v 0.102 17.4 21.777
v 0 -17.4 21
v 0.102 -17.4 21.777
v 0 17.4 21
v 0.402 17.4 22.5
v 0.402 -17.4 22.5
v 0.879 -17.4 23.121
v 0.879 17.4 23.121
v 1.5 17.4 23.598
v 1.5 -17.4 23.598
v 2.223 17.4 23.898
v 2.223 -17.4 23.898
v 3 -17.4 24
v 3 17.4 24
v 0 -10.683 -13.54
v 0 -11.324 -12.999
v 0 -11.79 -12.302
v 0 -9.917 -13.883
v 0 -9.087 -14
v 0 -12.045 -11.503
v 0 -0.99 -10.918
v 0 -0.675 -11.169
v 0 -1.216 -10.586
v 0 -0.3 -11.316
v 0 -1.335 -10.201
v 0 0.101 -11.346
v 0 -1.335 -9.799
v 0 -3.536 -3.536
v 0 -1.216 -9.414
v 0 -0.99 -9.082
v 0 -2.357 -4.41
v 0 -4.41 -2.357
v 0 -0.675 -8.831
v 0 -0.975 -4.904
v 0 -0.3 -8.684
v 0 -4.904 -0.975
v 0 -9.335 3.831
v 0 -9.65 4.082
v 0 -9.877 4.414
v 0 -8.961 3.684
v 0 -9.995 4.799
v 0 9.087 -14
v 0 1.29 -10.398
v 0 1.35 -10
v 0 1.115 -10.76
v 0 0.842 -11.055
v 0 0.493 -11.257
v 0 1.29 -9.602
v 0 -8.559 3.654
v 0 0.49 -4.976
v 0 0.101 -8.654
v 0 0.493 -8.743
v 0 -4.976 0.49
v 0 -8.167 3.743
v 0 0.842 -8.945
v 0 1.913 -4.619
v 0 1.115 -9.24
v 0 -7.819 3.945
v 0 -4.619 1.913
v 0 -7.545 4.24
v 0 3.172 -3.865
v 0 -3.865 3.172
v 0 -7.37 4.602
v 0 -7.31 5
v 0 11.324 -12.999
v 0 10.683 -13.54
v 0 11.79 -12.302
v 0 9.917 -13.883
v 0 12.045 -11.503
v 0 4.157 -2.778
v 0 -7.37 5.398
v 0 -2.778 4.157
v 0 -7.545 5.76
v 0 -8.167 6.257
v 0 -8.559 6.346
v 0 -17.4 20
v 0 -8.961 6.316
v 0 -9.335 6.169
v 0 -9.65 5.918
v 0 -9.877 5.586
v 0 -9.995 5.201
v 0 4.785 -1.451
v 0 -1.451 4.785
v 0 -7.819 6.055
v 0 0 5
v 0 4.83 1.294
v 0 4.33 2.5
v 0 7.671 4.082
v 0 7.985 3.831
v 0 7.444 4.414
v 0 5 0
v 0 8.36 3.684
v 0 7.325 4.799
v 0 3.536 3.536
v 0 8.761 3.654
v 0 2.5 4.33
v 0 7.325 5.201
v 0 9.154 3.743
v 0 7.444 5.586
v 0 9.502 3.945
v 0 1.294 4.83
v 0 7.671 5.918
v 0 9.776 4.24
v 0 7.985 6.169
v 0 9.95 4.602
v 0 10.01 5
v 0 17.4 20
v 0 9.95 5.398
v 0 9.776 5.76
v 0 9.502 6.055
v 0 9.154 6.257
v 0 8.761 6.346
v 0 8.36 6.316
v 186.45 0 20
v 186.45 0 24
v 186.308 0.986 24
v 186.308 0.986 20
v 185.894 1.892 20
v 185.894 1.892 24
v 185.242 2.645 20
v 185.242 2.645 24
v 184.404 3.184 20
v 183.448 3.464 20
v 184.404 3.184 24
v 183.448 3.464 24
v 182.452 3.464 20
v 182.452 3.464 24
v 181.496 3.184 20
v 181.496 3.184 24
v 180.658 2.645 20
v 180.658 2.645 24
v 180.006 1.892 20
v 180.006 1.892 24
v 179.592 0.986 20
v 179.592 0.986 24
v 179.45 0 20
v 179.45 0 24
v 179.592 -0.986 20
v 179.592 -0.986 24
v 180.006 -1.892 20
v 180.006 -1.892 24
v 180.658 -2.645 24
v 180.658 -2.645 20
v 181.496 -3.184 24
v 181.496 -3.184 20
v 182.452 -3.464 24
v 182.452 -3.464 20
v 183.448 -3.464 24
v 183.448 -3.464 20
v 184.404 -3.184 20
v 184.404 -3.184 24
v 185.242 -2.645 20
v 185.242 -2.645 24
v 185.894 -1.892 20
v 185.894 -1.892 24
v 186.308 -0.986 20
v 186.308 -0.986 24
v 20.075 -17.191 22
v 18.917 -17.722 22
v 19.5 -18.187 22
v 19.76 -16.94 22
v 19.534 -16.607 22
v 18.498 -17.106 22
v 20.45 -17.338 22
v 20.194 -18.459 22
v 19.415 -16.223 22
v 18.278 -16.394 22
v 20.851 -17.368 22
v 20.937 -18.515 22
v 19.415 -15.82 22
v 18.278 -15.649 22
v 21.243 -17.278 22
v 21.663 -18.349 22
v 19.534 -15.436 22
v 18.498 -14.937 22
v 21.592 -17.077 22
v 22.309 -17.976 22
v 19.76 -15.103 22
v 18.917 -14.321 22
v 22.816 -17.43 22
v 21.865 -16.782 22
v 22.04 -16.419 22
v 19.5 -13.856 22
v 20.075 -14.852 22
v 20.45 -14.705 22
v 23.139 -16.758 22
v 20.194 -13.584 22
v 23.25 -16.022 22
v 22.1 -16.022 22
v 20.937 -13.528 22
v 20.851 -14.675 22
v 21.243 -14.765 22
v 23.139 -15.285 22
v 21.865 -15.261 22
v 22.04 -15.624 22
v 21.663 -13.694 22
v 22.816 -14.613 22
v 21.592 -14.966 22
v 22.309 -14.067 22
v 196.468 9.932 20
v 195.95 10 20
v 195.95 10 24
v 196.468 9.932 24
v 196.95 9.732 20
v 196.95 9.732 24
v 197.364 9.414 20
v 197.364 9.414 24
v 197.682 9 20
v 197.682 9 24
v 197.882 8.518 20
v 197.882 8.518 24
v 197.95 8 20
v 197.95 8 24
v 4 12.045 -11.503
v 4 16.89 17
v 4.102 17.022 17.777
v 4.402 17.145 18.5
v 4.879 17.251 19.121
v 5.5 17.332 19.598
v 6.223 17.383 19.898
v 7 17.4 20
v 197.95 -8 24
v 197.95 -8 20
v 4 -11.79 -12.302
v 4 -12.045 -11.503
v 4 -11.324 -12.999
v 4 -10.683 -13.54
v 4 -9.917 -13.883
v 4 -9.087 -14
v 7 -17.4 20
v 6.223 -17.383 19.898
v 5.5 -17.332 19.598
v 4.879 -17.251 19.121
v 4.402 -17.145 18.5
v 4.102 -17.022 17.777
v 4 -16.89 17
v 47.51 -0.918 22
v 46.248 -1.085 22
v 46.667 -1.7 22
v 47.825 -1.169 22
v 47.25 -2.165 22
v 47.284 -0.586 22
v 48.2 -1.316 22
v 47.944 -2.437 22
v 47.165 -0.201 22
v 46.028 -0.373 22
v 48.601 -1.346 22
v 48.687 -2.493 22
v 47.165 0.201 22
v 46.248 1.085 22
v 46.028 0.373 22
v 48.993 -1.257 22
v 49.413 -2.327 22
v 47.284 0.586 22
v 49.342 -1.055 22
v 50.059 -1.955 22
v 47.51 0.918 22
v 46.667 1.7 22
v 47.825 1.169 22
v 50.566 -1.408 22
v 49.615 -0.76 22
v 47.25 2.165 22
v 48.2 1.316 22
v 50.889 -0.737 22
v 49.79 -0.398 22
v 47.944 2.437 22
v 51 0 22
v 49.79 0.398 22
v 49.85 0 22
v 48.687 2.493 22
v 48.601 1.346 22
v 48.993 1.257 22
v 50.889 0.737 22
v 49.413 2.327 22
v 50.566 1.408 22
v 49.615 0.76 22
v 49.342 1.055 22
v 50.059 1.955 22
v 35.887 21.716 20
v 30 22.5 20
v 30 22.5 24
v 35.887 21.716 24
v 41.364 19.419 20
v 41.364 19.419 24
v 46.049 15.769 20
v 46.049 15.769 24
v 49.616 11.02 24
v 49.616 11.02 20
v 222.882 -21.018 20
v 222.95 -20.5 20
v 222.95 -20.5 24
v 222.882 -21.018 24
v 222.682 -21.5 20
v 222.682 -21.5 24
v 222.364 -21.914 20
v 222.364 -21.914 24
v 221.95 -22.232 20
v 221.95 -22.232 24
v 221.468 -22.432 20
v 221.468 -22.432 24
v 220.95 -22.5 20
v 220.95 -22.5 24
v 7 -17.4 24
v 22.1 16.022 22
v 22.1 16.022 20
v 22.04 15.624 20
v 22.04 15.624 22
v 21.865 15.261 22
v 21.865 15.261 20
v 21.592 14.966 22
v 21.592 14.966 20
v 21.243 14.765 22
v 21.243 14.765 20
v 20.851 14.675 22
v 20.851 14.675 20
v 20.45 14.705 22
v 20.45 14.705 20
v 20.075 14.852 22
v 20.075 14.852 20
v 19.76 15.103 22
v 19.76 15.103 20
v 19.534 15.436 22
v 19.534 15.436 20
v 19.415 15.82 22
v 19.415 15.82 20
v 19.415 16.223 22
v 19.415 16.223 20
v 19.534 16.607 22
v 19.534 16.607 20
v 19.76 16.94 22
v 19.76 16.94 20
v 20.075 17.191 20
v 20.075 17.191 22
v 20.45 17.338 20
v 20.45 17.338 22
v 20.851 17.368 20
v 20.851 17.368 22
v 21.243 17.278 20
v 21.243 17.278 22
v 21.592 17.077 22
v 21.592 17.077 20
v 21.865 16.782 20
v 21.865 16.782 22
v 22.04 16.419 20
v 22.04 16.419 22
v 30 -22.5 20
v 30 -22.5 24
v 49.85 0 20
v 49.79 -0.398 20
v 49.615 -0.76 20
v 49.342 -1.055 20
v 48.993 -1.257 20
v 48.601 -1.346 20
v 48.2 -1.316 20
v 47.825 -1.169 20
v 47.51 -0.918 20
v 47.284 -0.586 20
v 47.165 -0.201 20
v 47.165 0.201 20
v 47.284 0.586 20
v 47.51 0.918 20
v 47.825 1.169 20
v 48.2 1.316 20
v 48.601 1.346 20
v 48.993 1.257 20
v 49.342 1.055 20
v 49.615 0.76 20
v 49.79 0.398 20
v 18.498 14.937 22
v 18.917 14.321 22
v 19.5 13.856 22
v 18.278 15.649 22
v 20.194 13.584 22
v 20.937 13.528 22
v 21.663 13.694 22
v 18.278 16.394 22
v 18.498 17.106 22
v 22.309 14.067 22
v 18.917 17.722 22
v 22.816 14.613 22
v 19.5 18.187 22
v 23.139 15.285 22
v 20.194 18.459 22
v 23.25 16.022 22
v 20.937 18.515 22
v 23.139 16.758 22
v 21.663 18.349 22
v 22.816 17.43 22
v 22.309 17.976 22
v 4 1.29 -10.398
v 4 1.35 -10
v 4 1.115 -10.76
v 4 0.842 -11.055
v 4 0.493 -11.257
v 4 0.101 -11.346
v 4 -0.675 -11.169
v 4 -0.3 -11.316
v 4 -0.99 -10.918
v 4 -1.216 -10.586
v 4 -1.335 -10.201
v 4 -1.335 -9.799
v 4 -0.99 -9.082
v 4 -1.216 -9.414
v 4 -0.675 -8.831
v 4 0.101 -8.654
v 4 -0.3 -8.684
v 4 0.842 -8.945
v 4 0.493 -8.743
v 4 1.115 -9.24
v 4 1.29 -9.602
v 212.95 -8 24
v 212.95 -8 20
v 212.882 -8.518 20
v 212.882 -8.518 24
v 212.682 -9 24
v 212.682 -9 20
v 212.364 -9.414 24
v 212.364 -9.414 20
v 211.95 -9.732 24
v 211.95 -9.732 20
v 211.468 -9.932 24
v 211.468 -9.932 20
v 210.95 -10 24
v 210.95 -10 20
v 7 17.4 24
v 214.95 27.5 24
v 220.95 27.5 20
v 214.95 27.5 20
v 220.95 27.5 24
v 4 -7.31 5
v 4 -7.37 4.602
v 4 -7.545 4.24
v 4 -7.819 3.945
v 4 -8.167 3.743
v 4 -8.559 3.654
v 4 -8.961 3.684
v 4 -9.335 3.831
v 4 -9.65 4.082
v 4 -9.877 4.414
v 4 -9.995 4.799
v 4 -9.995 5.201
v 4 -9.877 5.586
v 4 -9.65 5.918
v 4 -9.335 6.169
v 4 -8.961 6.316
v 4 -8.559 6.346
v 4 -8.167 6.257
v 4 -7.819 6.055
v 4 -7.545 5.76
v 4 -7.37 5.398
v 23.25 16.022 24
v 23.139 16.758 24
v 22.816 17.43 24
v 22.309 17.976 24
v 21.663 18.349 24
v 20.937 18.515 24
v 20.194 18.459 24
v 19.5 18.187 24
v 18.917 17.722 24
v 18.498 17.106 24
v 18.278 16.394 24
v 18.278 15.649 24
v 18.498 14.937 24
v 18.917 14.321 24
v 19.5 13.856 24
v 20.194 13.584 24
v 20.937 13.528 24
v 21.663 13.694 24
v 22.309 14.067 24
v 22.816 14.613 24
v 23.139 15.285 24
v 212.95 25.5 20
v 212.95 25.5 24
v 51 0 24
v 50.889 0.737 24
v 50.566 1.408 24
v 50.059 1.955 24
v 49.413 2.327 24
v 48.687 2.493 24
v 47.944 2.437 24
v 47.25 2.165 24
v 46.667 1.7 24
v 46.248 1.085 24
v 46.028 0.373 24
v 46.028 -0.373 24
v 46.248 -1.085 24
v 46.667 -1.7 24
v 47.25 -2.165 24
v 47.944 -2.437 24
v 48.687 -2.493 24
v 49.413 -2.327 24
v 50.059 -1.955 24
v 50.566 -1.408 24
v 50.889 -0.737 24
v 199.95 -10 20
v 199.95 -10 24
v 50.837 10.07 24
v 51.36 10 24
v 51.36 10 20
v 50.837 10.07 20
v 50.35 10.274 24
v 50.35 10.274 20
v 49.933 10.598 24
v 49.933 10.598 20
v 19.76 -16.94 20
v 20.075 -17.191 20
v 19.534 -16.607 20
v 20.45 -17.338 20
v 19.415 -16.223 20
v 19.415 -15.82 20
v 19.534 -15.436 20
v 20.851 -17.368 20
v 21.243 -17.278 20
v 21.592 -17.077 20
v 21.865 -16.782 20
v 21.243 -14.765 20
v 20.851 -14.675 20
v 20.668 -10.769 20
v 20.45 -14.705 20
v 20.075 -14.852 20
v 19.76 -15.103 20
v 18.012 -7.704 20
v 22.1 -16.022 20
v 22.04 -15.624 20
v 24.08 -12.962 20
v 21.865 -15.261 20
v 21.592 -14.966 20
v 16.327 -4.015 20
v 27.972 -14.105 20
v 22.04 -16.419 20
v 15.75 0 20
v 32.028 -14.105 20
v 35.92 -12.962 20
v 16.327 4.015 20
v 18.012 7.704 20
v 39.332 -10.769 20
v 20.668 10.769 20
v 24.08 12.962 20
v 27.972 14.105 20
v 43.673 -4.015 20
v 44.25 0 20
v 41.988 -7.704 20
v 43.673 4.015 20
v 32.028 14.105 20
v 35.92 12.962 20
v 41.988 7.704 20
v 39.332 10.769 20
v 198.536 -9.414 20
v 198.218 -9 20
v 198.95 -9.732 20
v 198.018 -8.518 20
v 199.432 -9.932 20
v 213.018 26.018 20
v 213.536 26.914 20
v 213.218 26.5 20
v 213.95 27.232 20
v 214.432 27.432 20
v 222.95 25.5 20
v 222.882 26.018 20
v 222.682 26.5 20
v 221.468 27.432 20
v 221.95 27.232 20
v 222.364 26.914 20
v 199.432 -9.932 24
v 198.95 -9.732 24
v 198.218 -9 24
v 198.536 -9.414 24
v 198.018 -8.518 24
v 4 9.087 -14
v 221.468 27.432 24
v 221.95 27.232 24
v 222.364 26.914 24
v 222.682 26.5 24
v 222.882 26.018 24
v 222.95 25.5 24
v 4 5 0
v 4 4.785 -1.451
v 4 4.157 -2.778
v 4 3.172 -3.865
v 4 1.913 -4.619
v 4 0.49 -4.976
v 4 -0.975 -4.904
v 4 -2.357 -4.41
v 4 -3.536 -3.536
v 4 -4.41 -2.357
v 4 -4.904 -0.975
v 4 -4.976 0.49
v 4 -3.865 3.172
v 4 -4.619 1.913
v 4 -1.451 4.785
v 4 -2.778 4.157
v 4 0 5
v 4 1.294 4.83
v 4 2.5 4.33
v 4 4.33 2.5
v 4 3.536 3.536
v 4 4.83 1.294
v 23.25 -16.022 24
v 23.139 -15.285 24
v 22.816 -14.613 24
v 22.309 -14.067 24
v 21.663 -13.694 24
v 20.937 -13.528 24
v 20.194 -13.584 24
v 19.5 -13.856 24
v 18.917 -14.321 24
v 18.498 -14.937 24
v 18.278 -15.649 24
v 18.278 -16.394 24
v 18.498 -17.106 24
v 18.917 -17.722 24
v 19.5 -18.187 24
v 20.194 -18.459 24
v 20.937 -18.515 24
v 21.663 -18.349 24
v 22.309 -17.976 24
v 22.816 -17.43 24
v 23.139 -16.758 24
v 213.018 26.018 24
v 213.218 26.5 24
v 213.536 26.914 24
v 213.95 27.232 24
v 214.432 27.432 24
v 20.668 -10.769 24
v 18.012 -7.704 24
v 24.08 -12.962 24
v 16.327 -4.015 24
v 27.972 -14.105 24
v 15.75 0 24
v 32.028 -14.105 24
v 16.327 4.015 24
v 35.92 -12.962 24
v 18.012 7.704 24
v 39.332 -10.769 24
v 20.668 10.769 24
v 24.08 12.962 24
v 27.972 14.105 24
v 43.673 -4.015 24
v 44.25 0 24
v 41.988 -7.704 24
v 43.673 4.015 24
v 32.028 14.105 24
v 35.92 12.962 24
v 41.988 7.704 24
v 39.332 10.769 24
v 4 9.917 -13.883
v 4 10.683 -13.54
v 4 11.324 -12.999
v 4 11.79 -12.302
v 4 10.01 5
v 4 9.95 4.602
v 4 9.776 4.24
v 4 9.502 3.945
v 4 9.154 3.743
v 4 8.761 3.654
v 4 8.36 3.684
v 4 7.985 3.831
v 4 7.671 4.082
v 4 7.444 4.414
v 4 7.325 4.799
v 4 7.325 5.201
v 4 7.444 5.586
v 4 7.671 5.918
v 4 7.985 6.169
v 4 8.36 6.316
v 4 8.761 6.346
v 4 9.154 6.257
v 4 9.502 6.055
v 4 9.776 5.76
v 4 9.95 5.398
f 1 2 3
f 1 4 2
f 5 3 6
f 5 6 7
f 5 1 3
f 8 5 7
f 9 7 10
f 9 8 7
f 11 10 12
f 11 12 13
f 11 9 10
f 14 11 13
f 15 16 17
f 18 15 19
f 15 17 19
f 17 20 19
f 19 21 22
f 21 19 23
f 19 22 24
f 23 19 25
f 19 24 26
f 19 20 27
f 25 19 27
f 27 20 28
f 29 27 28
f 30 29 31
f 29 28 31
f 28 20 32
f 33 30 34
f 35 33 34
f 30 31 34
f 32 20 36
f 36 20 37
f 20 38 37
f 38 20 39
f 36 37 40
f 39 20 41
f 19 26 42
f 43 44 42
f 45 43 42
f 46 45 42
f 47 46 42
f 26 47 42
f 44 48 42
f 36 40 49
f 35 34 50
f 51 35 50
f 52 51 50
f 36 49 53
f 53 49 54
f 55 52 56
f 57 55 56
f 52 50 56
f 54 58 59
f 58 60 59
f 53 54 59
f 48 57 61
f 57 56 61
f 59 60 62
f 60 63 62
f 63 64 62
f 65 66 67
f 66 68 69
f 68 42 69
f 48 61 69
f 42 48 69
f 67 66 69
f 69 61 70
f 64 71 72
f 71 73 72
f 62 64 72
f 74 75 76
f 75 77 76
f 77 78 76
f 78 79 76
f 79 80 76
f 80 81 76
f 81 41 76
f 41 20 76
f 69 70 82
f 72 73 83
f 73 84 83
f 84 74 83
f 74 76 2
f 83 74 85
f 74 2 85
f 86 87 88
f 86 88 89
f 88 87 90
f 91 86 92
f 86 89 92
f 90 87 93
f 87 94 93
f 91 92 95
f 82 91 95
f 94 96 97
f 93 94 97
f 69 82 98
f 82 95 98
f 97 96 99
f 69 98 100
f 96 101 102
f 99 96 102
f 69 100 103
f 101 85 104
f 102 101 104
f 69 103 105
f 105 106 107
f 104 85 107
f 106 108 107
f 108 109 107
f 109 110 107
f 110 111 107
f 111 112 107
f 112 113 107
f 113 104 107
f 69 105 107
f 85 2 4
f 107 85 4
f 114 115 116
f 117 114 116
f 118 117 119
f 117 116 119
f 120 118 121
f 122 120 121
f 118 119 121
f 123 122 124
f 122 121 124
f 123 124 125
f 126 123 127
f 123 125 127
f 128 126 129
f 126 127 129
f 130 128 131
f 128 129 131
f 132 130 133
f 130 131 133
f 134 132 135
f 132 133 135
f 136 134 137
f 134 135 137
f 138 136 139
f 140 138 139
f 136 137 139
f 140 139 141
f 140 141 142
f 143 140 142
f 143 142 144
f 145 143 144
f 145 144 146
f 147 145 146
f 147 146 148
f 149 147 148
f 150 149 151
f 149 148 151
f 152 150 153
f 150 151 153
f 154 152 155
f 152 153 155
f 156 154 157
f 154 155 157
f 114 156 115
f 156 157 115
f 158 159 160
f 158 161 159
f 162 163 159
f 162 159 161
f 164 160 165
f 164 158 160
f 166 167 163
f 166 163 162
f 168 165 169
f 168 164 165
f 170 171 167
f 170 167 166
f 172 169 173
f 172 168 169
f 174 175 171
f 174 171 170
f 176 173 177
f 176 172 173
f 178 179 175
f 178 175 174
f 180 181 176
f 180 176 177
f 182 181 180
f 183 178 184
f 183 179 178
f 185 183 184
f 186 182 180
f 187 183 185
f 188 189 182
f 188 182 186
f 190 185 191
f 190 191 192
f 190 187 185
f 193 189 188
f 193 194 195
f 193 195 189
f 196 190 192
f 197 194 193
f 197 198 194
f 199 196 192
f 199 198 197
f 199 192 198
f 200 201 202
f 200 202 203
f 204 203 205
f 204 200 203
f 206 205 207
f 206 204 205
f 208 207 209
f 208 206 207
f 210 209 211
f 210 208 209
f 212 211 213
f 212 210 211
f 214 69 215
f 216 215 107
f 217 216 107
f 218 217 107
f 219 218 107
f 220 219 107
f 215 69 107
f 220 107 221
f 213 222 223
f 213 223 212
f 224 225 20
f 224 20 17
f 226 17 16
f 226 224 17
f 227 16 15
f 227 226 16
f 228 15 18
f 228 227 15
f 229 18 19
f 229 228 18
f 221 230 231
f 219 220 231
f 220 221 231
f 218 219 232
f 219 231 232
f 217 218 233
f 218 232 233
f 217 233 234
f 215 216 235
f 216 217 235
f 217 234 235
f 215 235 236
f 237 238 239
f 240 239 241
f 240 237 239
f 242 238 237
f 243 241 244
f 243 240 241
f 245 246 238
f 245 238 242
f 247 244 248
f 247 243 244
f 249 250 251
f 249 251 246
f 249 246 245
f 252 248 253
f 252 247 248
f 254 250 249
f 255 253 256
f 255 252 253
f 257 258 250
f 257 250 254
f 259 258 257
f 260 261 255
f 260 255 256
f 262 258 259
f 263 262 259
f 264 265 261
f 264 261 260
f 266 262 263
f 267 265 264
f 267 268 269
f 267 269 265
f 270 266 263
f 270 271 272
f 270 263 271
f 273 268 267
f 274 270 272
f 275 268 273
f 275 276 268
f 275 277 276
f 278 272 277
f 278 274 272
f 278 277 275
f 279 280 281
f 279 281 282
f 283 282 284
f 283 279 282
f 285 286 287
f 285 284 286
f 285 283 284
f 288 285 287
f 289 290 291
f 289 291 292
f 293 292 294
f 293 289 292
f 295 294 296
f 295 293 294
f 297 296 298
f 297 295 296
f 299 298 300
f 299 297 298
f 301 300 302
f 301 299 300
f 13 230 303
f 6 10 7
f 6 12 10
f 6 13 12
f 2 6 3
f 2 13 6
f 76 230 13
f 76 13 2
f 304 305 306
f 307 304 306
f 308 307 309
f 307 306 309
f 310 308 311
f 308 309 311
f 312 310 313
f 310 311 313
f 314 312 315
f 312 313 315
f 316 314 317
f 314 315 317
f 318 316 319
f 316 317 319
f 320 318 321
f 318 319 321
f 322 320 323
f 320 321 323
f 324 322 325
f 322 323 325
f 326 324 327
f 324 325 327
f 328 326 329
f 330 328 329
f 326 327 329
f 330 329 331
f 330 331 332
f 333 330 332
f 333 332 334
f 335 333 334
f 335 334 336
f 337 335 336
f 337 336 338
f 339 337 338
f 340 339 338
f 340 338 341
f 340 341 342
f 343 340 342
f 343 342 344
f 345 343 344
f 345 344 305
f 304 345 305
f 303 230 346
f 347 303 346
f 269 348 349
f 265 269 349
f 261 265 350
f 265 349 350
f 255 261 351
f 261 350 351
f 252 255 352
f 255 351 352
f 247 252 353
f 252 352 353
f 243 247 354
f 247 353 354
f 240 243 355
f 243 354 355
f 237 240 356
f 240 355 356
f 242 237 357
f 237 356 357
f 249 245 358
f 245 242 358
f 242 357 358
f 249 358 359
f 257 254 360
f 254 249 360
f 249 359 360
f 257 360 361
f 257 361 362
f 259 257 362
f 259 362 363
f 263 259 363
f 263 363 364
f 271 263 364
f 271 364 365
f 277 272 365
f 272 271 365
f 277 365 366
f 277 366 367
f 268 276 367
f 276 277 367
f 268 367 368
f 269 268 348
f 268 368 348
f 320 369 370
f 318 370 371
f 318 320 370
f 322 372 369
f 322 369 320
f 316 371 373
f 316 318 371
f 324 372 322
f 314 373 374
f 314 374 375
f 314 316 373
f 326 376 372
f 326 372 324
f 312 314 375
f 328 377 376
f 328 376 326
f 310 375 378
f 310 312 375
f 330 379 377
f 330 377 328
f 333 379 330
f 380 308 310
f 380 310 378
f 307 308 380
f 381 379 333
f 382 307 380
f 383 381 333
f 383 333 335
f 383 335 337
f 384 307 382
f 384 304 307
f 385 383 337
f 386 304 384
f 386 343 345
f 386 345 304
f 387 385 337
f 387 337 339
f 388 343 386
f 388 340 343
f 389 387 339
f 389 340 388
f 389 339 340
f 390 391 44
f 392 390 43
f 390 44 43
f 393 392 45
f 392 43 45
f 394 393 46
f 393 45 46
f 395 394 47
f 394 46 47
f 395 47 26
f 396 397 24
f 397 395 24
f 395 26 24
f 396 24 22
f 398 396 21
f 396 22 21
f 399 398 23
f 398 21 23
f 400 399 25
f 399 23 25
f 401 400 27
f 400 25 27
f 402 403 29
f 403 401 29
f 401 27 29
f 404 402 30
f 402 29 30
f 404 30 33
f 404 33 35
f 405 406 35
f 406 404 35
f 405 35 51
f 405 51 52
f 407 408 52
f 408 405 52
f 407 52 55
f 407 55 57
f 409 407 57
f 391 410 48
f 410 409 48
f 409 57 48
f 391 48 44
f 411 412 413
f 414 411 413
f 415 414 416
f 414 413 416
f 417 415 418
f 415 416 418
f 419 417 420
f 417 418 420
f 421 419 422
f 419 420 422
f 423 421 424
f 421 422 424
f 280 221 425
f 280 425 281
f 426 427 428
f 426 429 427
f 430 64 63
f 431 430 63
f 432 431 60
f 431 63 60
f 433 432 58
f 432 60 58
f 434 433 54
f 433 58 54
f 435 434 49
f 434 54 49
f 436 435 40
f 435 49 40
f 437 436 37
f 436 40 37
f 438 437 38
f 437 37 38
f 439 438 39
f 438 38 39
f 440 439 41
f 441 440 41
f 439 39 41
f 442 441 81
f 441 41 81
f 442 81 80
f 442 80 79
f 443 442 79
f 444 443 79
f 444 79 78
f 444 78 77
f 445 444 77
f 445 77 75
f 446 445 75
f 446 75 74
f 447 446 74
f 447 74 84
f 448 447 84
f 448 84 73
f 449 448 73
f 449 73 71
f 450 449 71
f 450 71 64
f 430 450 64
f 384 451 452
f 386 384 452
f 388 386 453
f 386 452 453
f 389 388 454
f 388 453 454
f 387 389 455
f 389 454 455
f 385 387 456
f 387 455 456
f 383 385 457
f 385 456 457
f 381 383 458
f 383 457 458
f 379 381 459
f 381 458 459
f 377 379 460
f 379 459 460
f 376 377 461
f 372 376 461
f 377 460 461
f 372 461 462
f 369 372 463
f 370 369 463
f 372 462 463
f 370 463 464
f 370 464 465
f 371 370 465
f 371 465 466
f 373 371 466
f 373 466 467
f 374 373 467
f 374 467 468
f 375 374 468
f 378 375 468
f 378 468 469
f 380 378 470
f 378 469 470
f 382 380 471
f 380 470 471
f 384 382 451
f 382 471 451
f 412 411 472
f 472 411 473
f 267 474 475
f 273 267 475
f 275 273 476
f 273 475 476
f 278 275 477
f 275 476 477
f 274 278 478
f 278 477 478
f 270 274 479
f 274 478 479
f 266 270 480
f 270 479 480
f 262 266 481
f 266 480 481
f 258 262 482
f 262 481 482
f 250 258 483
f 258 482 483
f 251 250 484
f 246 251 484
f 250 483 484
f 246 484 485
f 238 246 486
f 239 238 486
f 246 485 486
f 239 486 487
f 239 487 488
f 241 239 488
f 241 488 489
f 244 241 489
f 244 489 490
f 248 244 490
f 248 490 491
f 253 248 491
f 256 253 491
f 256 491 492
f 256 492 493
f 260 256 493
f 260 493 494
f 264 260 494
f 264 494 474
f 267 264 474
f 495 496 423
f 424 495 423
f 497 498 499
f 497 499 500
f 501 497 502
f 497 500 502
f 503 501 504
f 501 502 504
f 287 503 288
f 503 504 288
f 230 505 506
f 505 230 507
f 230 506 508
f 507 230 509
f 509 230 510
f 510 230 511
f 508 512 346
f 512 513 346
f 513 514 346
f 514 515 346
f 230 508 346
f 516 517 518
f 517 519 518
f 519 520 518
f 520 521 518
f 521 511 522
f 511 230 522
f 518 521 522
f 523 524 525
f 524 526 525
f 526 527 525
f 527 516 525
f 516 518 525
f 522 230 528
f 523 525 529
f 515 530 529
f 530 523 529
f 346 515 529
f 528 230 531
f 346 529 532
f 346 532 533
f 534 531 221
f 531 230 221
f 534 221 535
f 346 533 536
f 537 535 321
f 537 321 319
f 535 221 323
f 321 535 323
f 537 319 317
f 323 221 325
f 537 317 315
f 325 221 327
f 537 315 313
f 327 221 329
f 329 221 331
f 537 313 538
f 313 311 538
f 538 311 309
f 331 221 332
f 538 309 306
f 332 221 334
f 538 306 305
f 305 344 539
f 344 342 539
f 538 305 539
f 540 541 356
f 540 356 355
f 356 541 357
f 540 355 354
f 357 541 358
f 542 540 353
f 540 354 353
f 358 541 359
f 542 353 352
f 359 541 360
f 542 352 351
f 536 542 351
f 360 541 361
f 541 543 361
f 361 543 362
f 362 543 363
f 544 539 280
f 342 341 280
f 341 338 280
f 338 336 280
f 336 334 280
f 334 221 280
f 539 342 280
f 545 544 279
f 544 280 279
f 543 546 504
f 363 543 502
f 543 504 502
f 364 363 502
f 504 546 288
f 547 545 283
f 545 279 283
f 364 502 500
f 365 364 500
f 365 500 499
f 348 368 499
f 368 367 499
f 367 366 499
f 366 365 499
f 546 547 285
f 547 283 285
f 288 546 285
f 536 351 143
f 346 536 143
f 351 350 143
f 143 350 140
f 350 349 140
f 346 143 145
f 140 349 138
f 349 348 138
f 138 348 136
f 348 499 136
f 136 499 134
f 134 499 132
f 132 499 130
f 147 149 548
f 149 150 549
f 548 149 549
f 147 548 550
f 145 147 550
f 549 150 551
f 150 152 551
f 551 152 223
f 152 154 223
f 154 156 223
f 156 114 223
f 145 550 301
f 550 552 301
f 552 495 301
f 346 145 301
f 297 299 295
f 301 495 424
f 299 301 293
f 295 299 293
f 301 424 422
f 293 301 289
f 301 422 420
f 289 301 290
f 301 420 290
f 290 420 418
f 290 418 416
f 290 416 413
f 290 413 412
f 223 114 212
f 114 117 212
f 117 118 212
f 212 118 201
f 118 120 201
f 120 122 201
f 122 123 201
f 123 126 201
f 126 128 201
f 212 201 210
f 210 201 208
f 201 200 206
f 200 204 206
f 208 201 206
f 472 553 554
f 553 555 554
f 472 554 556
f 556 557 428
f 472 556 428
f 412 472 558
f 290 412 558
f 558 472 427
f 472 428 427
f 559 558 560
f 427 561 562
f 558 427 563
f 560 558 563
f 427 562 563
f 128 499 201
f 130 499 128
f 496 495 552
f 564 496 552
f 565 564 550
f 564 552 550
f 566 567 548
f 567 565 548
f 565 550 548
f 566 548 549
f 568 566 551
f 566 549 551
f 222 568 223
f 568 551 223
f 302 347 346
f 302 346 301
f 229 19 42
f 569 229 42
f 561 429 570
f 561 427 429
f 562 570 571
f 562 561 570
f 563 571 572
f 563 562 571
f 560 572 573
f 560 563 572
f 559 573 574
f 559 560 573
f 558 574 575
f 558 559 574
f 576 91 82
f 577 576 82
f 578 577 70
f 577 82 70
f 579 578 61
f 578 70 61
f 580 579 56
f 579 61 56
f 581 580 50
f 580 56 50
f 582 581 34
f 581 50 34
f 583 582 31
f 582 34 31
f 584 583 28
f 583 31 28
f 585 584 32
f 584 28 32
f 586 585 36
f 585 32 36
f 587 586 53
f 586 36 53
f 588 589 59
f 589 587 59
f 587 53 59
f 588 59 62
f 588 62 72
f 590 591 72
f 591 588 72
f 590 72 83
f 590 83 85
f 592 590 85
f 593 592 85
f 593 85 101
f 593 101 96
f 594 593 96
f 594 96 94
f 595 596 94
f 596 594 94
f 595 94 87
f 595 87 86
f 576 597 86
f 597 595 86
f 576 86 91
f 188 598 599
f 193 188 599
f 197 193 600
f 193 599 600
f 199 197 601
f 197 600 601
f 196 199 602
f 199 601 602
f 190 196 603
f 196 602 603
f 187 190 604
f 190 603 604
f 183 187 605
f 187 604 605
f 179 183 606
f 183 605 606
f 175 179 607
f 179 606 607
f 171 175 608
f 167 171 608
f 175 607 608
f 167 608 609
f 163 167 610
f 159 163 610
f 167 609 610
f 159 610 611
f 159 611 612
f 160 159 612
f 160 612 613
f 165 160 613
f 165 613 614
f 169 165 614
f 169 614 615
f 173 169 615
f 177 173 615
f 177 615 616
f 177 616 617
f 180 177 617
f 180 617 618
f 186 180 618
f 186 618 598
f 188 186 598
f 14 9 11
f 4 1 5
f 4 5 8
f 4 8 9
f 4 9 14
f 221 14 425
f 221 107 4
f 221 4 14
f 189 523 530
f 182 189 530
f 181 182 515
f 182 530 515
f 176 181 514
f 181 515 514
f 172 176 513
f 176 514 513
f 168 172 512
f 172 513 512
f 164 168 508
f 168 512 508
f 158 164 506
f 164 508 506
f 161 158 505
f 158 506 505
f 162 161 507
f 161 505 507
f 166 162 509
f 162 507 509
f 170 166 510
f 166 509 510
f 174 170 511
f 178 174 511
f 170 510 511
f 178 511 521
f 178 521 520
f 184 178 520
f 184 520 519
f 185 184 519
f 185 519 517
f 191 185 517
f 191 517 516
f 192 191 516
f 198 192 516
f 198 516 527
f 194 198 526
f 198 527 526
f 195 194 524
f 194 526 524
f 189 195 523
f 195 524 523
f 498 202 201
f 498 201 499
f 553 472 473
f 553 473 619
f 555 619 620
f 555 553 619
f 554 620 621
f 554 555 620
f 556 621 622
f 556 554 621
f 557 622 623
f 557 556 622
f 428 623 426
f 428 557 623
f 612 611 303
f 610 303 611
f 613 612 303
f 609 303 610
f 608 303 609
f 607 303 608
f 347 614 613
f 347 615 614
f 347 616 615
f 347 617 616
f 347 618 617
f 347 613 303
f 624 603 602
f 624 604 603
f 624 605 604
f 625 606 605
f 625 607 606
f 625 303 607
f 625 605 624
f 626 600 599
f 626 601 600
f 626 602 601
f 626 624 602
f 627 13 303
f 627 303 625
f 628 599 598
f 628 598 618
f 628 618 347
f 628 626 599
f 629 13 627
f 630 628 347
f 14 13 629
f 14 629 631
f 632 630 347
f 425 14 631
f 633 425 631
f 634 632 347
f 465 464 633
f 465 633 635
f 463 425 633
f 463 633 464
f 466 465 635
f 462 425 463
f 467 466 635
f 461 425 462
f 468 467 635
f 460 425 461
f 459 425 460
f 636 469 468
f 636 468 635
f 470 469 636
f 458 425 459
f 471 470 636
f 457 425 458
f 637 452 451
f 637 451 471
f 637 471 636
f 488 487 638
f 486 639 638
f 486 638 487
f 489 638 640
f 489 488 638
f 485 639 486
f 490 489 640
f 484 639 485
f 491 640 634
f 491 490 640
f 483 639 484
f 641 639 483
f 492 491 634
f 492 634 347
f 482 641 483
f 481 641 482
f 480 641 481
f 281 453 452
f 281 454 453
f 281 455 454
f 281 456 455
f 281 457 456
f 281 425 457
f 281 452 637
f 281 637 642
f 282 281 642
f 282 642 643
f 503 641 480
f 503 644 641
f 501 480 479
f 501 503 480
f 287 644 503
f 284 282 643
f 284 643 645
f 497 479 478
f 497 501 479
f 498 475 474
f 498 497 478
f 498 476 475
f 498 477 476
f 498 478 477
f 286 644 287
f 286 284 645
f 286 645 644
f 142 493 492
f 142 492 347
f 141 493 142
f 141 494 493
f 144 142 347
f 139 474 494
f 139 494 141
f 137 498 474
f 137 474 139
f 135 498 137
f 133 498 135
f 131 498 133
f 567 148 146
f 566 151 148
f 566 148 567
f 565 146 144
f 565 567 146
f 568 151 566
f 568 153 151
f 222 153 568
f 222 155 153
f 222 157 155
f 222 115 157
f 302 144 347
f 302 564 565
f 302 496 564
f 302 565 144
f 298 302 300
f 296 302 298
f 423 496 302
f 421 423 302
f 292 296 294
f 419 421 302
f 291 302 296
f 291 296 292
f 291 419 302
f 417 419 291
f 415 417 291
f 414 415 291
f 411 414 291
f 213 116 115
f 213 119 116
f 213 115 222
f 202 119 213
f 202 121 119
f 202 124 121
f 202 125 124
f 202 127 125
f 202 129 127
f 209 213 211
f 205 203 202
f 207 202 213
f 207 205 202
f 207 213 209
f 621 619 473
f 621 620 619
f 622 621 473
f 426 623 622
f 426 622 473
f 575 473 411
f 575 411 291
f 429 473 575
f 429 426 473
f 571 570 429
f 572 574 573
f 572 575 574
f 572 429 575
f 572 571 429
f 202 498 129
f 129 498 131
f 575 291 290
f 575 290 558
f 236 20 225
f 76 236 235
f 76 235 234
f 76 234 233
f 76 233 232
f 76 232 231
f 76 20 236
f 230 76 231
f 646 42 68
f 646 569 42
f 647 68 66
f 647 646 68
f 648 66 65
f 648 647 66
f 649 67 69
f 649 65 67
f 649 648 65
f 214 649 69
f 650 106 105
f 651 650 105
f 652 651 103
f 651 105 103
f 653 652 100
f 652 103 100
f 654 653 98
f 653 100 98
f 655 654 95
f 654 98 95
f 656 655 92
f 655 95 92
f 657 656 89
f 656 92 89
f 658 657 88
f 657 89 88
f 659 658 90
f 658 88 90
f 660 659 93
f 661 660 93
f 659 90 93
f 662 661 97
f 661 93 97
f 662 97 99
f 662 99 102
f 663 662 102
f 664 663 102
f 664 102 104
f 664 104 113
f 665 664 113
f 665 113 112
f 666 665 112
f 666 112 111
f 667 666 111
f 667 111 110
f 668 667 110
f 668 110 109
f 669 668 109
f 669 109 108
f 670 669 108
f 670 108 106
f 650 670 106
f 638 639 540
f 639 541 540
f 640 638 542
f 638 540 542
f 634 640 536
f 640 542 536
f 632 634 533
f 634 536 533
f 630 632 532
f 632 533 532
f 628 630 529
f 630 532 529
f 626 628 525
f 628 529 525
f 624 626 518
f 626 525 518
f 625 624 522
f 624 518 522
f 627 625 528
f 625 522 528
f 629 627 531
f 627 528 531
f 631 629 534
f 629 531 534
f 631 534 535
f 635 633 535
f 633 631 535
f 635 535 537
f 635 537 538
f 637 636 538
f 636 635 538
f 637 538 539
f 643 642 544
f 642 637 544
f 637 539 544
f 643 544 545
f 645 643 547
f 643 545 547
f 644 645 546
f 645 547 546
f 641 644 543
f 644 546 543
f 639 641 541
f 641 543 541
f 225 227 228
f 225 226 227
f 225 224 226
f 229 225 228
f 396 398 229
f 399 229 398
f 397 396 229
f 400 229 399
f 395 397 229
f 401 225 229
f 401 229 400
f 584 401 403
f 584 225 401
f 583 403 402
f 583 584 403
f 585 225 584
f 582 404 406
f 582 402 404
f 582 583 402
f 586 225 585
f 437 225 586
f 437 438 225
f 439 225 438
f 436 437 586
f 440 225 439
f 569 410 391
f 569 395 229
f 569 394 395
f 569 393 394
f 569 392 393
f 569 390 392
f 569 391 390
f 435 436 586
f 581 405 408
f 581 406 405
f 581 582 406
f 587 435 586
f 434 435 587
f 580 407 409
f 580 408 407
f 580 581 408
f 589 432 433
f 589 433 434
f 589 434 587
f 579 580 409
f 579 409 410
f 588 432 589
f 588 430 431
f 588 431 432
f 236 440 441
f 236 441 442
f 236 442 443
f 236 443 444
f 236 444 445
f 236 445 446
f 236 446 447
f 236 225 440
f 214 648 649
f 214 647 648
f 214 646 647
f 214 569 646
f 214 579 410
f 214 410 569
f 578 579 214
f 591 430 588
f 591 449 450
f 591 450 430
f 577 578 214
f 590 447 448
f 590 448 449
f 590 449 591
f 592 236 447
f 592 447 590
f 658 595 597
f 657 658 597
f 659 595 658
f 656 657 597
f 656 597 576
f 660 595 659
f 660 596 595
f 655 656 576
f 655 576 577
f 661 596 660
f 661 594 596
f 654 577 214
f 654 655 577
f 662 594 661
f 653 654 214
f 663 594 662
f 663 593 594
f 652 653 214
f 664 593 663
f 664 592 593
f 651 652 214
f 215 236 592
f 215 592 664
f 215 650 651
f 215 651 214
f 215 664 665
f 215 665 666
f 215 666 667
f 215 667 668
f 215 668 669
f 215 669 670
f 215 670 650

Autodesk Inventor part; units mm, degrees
ref_plane "YZ Plane" through (0, 0, 0) normal (1, 0, 0) x (0, 1, 0)
ref_plane "XZ Plane" through (0, 0, 0) normal (0, 1, 0) x (-1, 0, 0)
ref_plane "XY Plane" through (0, 0, 0) normal (0, 0, 1) x (1, 0, 0)
sketch "スケッチ1" plane through (0, 0, 0) normal (1, 0, 0) x (0, 1, 0)
  circle A0 centre (0, 0) radius 10
  circle A1 centre (0, -10) radius 1.35
  circle A2 centre (8.6603, 5) radius 1.35
  circle A3 centre (-8.6603, 5) radius 1.35
  circle A4 centre (0, 0) radius 5
  line L0 (0, 0) -> (0, 50)
  circle A5 centre (0, 50) radius 22.5
  circle A6 centre (0, 0) radius 14
  line L1 (-14, 0) -> (-22.5, 50)
  line L2 (14, 0) -> (22.5, 50)
  line L3 (0, -14) -> (-11.62, -14)
  line L4 (-11.62, -14) -> (-14, 0)
  line L5 (0, -14) -> (11.62, -14)
  line L6 (11.62, -14) -> (14, 0)
  line L7 (0, 20) -> (-17.4, 20)
  line L8 (0, 20) -> (17.4, 20)
  dimension "d0" = 20
  dimension "d1" = 2.7
  dimension "d4" = 360
  dimension "d6" = 10
  dimension "d7" = 50
  dimension "d8" = 45
  dimension "d9" = 28
extrude "押し出し1" add sketch "スケッチ1" along normal blind 4 contours A0 A1 A3 A2 | A6 L6 L4 | A6 L1 L7 L0 | L0 L8 L2 A6 | L6 L5 A6 | A6 L3 L4
sketch "スケッチ2" plane through (0, -17.4, 20) normal (0, 0, 1) x (1, 0, 0)
  line L0 (0, 17.4) -> (30, 17.4)
  circle A0 centre (30, 17.4) radius 22.5
  circle A1 centre (30, 17.4) radius 18.5
  circle A2 centre (30, 17.4) radius 14.25
  circle A3 centre (48.5, 17.4) radius 1.35
  circle A4 centre (20.75, 33.4215) radius 1.35
  circle A5 centre (20.75, 1.3785) radius 1.35
  line L1 (0, 29.02) -> (0, 34.8) projected
  line L2 (0, 0) -> (0, 5.78) projected
  line L3 (0, 34.8) -> (0, 0)
  line L4 (4, 29.02) -> (4, 34.8) projected
  line L5 (4, 34.8) -> (7, 34.8)
  line L6 (7, 34.8) -> (30, 39.9)
  line L7 (4, 0) -> (4, 5.78) projected
  line L8 (4, 0) -> (7, 0)
  line L9 (7, 0) -> (30, -5.1)
  line L10 (4, 0) -> (0, 0)
  line L11 (0, 34.8) -> (4, 34.8) projected
  line L12 (0, 0) -> (0, 34.8)
  line L13 (0, 34.8) -> (4, 34.8)
  dimension "d14" = 37
  dimension "d12" = 30
  dimension "d13" = 45
  dimension "d15" = 28.5
  dimension "d16" = 2.7
  dimension "d19" = 360
  dimension "d21" = 3
  dimension "d22" = 3
extrude "押し出し2" add sketch "スケッチ2" along normal blind 4 contours L3 L1 L11 L5 L6 A0 L0 | L0 A0 L9 L8 L10 L2 L3 | A1 A4 A3 A5 | A0 L6 L9
fillet "フィレット1" radius 3 2 edges at (4, 0, 20) (0, 0, 24)
fillet "フィレット2" radius 3 2 edges at (2, -11.62, -14) (2, 11.62, -14)
sketch "スケッチ7" plane through (0, -17.4, 24) normal (0, 0, 1) x (1, 0, 0)
  circle A0 centre (30, 17.4) radius 14.25 projected
  line L0 (30, 17.4) -> (182.95, 17.4)
  line L1 (30, 17.4) -> (182.95, 17.4) construction
  circle A1 centre (182.95, 17.4) radius 3.5
  circle A2 centre (182.95, 17.4) radius 10
  line L2 (182.95, 27.4) -> (50.1556, 27.4)
  arc A3 (30, -5.1) -> (30, 39.9) centre (30, 17.4) ccw projected
  line L3 (182.95, 27.4) -> (315.7444, 27.4) construction
  line L4 (182.95, 7.4) -> (50.1556, 7.4)
  point P0 (0, 17.4)
  dimension "d55" = 152.95
  dimension "d56" = 0
  dimension "d57" = 7
  dimension "d58" = 20
  dimension "d59" = 180
extrude "押し出し7" add sketch "スケッチ7" against normal blind 4 contours A3 L2 A2 L0 | L0 A2 L4 A3 | A2
sketch "スケッチ8" plane through (0, -17.4, 24) normal (0, 0, 1) x (1, 0, 0)
  circle A0 centre (20.75, 33.4215) radius 1.35 projected
  circle A1 centre (20.75, 33.4215) radius 2.5
  circle A2 centre (48.5, 17.4) radius 1.35 projected
  circle A3 centre (48.5, 17.4) radius 2.5
  circle A4 centre (20.75, 1.3785) radius 1.35 projected
  circle A5 centre (20.75, 1.3785) radius 2.5
  point P0 (0, 17.4)
  dimension "d63" = 5
  dimension "d64" = 5
  dimension "d65" = 5
extrude "押し出し8" cut sketch "スケッチ8" against normal blind 2 contours A0 | A1 | A3 | A4 | A5
sketch "スケッチ9" plane through (0, -17.4, 24) normal (0, 0, 1) x (1, 0, 0)
  line L0 (50.1556, 27.4) -> (182.95, 27.4) projected
  line L1 (182.95, 27.4) -> (197.95, 27.4)
  line L2 (7, 0) -> (30, -5.1) projected
  line L3 (30, -5.1) -> (197.95, -5.1)
  line L4 (197.95, -5.1) -> (197.95, 27.4)
  line L5 (197.95, -5.1) -> (222.95, -5.1)
  line L6 (222.95, -5.1) -> (222.95, 44.9)
  line L7 (222.95, 44.9) -> (212.95, 44.9)
  line L8 (197.95, 7.4) -> (212.95, 7.4)
  line L9 (212.95, 7.4) -> (212.95, 44.9)
  circle A0 centre (182.95, 17.4) radius 3.5 projected
  circle A1 centre (182.95, 17.4) radius 10
  circle A2 centre (30, 17.4) radius 14.25 projected
  circle A3 centre (30, 17.4) radius 22.5
  line L10 (182.95, 7.4) -> (50.1556, 7.4) projected
  line L11 (50.1556, 7.4) -> (182.95, 7.4)
  point P0 (0, 17.4)
  point P1 (192.95, 17.4)
  point P2 (20.4894, -2.9911)
  dimension "d68" = 15
  dimension "d69" = 25
  dimension "d70" = 50
  dimension "d71" = 10
extrude "押し出し9" add sketch "スケッチ9" against normal blind 4 contours L0 A1 L10 A3 | L1 L4 L3 A3 L10 A1 | L8 L9 L7 L6 L5 L4
fillet "フィレット4" radius 2 7 edges at (197.95, 10, 22) (50.1556, 10, 22) (212.95, 27.5, 22) (212.95, -10, 22) (222.95, 27.5, 22) (197.95, -10, 22) (222.95, -22.5, 22)
properties part number "motor_holder_2" material "アルミニウム 6061"
